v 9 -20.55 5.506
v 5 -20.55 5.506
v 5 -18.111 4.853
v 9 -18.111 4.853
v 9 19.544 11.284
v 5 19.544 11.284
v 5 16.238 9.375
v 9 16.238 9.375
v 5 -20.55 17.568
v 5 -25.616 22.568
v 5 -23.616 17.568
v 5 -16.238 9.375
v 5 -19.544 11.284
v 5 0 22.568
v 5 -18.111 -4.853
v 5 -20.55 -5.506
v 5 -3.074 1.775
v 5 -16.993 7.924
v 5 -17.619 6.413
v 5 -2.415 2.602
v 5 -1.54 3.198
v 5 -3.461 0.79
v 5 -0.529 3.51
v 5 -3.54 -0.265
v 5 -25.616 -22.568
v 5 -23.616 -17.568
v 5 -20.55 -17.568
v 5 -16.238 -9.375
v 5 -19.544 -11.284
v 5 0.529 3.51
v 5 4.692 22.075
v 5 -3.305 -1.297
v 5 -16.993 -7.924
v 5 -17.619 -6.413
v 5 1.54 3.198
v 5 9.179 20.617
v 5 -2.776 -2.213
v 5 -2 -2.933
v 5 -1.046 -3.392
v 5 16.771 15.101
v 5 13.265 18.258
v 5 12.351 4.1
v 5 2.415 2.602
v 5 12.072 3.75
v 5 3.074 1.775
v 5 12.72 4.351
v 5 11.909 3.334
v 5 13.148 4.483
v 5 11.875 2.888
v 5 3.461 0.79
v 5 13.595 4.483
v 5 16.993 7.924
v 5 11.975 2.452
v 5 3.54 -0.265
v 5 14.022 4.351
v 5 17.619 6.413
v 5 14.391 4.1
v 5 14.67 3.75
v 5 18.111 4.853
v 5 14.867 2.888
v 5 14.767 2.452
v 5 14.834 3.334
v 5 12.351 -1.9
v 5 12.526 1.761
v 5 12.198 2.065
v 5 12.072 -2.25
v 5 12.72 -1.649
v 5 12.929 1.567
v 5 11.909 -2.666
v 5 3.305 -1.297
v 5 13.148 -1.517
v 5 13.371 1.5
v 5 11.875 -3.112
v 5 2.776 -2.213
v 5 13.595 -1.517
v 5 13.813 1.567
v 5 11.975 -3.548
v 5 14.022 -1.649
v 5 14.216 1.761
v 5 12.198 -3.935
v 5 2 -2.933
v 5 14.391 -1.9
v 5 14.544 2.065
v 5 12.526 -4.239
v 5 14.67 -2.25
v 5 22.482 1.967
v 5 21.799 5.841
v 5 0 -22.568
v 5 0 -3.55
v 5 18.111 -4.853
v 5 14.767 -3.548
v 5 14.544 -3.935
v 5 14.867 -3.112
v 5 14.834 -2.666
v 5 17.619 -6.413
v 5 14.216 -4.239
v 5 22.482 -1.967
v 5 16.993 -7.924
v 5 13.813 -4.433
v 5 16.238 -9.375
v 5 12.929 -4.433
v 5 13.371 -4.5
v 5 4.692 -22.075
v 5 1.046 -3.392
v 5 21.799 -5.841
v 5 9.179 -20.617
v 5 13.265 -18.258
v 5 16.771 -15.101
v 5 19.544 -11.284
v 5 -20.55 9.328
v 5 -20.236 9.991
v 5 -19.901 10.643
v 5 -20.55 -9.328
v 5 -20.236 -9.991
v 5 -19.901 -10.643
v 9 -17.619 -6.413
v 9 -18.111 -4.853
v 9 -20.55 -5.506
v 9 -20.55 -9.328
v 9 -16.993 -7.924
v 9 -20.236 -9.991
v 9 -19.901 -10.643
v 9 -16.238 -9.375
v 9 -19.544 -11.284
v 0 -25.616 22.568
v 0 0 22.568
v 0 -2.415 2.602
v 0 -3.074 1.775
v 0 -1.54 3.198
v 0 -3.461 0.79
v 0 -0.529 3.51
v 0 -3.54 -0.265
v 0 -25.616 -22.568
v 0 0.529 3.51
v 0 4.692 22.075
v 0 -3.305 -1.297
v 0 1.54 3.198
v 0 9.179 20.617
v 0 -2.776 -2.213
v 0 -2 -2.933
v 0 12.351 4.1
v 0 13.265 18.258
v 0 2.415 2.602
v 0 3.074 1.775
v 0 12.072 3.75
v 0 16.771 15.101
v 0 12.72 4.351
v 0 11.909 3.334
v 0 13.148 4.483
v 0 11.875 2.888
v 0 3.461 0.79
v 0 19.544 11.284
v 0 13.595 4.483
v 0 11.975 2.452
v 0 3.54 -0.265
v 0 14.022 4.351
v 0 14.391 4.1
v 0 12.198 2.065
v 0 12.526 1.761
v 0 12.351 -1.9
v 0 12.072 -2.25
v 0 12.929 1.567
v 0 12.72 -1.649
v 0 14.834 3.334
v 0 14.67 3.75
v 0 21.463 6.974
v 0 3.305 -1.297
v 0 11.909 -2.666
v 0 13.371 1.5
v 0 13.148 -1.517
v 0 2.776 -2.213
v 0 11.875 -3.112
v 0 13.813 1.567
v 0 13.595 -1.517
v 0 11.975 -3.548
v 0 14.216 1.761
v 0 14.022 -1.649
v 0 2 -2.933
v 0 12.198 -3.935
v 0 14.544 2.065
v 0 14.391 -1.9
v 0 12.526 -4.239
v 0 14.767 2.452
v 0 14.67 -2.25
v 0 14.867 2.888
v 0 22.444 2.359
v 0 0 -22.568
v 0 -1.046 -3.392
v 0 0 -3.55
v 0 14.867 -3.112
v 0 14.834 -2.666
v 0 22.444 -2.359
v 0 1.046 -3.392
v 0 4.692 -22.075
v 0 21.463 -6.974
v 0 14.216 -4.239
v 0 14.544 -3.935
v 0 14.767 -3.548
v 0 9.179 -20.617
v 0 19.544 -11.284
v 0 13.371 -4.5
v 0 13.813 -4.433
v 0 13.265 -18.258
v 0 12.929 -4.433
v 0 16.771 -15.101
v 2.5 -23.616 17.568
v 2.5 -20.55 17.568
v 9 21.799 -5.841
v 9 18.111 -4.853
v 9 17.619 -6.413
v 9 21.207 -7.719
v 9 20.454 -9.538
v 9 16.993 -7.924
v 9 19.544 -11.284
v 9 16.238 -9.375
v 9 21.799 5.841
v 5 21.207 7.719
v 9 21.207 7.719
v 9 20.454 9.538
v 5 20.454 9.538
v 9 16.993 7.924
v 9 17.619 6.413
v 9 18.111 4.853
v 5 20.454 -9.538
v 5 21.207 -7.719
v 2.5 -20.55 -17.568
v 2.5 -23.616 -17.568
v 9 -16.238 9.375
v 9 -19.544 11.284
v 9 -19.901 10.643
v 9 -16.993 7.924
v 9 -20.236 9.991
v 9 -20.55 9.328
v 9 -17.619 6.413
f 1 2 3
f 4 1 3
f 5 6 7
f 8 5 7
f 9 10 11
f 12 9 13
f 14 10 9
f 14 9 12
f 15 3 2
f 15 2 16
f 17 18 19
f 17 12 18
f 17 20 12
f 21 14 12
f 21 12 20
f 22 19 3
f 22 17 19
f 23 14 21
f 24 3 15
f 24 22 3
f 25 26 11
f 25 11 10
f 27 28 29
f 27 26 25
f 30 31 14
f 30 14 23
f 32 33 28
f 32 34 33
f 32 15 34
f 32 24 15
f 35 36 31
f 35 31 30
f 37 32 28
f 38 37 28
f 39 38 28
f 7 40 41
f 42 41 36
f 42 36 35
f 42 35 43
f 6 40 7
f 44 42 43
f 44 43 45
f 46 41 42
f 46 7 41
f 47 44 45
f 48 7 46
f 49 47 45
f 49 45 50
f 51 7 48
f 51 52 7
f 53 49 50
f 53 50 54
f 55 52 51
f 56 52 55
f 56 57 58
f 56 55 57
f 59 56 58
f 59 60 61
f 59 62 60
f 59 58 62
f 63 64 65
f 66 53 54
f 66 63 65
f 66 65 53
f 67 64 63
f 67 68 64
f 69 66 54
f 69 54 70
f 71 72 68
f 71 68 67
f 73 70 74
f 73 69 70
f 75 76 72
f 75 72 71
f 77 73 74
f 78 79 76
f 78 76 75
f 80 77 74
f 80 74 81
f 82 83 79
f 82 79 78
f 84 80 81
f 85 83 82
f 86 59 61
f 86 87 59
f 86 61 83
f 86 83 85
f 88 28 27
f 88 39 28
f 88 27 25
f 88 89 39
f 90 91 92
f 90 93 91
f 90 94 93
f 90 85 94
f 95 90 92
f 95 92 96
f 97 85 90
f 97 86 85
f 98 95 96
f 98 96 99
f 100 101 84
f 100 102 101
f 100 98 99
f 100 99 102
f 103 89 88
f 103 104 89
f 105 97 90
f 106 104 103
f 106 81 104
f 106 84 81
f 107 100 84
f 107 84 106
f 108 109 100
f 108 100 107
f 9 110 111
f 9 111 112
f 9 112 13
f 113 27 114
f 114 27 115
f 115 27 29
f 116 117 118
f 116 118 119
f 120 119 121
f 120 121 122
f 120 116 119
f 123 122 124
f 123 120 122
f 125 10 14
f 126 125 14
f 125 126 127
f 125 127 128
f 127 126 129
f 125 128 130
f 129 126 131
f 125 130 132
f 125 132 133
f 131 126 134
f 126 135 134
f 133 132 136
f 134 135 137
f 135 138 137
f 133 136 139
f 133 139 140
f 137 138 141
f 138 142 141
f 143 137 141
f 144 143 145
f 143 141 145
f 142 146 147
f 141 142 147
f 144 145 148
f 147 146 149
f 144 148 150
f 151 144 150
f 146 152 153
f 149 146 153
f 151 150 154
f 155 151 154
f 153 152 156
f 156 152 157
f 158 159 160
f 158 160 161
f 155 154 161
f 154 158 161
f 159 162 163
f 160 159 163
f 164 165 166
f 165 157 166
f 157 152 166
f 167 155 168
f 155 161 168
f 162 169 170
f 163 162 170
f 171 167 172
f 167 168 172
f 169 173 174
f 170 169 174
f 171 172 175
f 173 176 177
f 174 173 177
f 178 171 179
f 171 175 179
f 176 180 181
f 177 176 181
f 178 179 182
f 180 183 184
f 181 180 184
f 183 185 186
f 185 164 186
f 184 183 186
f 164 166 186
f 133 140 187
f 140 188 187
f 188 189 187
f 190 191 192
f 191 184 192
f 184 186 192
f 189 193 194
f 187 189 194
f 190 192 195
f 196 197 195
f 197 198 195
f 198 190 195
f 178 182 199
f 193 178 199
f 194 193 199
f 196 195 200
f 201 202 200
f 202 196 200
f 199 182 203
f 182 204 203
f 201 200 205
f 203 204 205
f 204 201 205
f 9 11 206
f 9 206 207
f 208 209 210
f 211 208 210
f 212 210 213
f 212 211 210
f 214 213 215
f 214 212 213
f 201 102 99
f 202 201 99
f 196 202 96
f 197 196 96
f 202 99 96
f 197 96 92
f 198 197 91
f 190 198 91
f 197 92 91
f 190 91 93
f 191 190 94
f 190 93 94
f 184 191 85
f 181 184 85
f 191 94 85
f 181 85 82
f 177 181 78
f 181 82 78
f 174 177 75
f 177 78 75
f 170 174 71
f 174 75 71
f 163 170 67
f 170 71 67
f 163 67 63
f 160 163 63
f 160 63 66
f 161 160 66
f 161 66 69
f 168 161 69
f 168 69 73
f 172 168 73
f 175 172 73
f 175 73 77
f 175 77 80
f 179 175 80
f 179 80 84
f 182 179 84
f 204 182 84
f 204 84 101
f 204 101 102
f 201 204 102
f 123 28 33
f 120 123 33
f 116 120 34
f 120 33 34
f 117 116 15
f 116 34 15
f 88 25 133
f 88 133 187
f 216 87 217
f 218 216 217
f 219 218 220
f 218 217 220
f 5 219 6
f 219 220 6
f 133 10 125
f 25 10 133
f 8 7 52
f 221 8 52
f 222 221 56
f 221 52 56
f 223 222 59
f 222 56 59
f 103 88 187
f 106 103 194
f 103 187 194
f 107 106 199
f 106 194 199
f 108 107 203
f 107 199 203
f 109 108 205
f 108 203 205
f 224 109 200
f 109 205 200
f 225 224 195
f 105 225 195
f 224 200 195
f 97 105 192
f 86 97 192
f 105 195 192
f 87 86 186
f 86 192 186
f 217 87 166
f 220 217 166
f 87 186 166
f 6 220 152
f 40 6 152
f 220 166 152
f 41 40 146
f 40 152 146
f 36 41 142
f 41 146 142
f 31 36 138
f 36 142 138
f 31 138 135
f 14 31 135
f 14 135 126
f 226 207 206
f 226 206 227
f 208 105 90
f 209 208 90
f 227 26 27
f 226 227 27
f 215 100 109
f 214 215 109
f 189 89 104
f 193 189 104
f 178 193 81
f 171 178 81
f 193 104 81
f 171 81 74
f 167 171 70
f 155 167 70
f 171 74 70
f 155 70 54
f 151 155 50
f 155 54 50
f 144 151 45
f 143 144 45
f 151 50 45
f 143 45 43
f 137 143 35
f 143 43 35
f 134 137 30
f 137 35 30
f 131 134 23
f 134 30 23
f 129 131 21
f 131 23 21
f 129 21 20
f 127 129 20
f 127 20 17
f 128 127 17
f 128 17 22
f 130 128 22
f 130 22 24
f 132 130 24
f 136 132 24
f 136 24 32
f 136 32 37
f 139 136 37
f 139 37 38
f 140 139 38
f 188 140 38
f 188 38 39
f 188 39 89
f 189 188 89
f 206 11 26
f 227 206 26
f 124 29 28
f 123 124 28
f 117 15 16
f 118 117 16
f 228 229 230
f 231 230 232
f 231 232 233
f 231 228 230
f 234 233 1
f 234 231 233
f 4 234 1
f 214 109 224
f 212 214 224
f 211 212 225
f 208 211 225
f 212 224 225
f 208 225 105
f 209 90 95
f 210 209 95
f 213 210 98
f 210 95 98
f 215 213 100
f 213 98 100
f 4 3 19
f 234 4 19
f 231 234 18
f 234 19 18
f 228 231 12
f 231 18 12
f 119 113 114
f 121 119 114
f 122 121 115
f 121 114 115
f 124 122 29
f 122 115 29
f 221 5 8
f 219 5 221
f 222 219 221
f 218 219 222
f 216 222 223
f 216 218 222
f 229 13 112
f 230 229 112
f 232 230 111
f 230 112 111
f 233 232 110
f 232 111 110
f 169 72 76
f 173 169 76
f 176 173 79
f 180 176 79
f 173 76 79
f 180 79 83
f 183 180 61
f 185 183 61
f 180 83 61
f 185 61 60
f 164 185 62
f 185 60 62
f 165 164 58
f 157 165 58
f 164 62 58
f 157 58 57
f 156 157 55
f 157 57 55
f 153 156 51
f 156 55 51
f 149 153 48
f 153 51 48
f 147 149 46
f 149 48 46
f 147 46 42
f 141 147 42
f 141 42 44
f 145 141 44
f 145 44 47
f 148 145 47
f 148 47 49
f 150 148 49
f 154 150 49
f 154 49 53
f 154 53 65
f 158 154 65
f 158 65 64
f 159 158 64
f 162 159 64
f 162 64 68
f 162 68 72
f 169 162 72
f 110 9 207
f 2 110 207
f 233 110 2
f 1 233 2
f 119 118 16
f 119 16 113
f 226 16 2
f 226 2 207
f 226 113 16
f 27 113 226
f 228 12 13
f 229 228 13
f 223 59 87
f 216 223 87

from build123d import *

# Parameters (mm, degrees)
SKETCH1_R               = 22.567960526
BOSS_EXTRUDE1_DEPTH     = 5
SKETCH2_W               = 45.135921052
SKETCH2_H               = 25.616013259
BOSS_EXTRUDE2_DEPTH     = 5
SKETCH3_R               = 1.5
SKETCH3_R_2             = 3.55
CUT_EXTRUDE1_DEPTH      = 1
CUT_EXTRUDE1_DEPTH_BACK = 6
SKETCH4_W               = 35.135921052
SKETCH4_H               = 3.066013259
CUT_EXTRUDE2_DEPTH      = 2.5
BOSS_EXTRUDE3_DEPTH     = 4


with BuildPart() as part:
    # Sketch1 → Boss-Extrude1 (new body)
    with BuildSketch(Plane(origin=(0, 0, 0), x_dir=(0, 0, -1), z_dir=(1, 0, 0))):
        Circle(SKETCH1_R)
    extrude(amount=BOSS_EXTRUDE1_DEPTH)

    # Sketch2 → Boss-Extrude2 (add)
    with BuildSketch(Plane(origin=(5, 0, 0), x_dir=(0, 0, -1), z_dir=(1, 0, 0))):
        with Locations((0, -12.80800663)):
            Rectangle(SKETCH2_W, SKETCH2_H)
    extrude(amount=-BOSS_EXTRUDE2_DEPTH)

    # Sketch3 → Cut-Extrude1 (cut, two sides)
    with BuildSketch(Plane(origin=(5, 0, 0), x_dir=(0, 0, -1), z_dir=(1, 0, 0))) as cut_extrude1_sk:
        with Locations((-3, 13.371154887)):
            Circle(SKETCH3_R)
        with Locations((3, 13.371154887)):
            Circle(SKETCH3_R)
        Circle(SKETCH3_R_2)
    extrude(amount=CUT_EXTRUDE1_DEPTH, mode=Mode.SUBTRACT)
    extrude(cut_extrude1_sk.sketch, amount=-CUT_EXTRUDE1_DEPTH_BACK, mode=Mode.SUBTRACT)

    # Sketch4 → Cut-Extrude2 (cut)
    with BuildSketch(Plane(origin=(5, 0, 0), x_dir=(0, 0, -1), z_dir=(1, 0, 0))):
        with Locations((0, -22.08300663)):
            Rectangle(SKETCH4_W, SKETCH4_H)
    extrude(amount=-CUT_EXTRUDE2_DEPTH, mode=Mode.SUBTRACT)

    # Sketch5 → Boss-Extrude3 (add)
    with BuildSketch(Plane(origin=(5, 0, 0), x_dir=(0, 0, -1), z_dir=(1, 0, 0))):
        with BuildLine():
            Line((-11.283980263, 19.544427127), (-9.375, 16.237976321))
            ThreePointArc((-9.375, 16.237976321), (-7.175314357, 17.322741235), (-4.852857096, 18.111109243))
            Line((-4.852857096, 18.111109243), (-5.841017993, 21.798975919))
            ThreePointArc((-5.841017993, 21.798975919), (-8.636384596, 20.850076821), (-11.283980263, 19.544427127))
        make_face()
        with BuildLine():
            Line((5.841017993, 21.798975919), (4.852857096, 18.111109243))
            ThreePointArc((4.852857096, 18.111109243), (7.175314357, 17.322741235), (9.375, 16.237976321))
            Line((9.375, 16.237976321), (11.283980263, 19.544427127))
            ThreePointArc((11.283980263, 19.544427127), (8.636384596, 20.850076821), (5.841017993, 21.798975919))
        make_face()
        with BuildLine():
            Line((-5.506355904, -20.55), (-4.852857096, -18.111109243))
            ThreePointArc((-4.852857096, -18.111109243), (-7.175314357, -17.322741235), (-9.375, -16.237976321))
            Line((-9.375, -16.237976321), (-11.283980263, -19.544427127))
            ThreePointArc((-11.283980263, -19.544427127), (-10.318214034, -20.071056312), (-9.327933443, -20.55))
            Line((-9.327933443, -20.55), (-5.506355904, -20.55))
        make_face()
        with BuildLine():
            Line((11.283980263, -19.544427127), (9.375, -16.237976321))
            ThreePointArc((9.375, -16.237976321), (7.175314357, -17.322741235), (4.852857096, -18.111109243))
            Line((4.852857096, -18.111109243), (5.506355904, -20.55))
            Line((5.506355904, -20.55), (9.327933443, -20.55))
            ThreePointArc((9.327933443, -20.55), (10.318214034, -20.071056312), (11.283980263, -19.544427127))
        make_face()
    extrude(amount=BOSS_EXTRUDE3_DEPTH)


solid = part.part
